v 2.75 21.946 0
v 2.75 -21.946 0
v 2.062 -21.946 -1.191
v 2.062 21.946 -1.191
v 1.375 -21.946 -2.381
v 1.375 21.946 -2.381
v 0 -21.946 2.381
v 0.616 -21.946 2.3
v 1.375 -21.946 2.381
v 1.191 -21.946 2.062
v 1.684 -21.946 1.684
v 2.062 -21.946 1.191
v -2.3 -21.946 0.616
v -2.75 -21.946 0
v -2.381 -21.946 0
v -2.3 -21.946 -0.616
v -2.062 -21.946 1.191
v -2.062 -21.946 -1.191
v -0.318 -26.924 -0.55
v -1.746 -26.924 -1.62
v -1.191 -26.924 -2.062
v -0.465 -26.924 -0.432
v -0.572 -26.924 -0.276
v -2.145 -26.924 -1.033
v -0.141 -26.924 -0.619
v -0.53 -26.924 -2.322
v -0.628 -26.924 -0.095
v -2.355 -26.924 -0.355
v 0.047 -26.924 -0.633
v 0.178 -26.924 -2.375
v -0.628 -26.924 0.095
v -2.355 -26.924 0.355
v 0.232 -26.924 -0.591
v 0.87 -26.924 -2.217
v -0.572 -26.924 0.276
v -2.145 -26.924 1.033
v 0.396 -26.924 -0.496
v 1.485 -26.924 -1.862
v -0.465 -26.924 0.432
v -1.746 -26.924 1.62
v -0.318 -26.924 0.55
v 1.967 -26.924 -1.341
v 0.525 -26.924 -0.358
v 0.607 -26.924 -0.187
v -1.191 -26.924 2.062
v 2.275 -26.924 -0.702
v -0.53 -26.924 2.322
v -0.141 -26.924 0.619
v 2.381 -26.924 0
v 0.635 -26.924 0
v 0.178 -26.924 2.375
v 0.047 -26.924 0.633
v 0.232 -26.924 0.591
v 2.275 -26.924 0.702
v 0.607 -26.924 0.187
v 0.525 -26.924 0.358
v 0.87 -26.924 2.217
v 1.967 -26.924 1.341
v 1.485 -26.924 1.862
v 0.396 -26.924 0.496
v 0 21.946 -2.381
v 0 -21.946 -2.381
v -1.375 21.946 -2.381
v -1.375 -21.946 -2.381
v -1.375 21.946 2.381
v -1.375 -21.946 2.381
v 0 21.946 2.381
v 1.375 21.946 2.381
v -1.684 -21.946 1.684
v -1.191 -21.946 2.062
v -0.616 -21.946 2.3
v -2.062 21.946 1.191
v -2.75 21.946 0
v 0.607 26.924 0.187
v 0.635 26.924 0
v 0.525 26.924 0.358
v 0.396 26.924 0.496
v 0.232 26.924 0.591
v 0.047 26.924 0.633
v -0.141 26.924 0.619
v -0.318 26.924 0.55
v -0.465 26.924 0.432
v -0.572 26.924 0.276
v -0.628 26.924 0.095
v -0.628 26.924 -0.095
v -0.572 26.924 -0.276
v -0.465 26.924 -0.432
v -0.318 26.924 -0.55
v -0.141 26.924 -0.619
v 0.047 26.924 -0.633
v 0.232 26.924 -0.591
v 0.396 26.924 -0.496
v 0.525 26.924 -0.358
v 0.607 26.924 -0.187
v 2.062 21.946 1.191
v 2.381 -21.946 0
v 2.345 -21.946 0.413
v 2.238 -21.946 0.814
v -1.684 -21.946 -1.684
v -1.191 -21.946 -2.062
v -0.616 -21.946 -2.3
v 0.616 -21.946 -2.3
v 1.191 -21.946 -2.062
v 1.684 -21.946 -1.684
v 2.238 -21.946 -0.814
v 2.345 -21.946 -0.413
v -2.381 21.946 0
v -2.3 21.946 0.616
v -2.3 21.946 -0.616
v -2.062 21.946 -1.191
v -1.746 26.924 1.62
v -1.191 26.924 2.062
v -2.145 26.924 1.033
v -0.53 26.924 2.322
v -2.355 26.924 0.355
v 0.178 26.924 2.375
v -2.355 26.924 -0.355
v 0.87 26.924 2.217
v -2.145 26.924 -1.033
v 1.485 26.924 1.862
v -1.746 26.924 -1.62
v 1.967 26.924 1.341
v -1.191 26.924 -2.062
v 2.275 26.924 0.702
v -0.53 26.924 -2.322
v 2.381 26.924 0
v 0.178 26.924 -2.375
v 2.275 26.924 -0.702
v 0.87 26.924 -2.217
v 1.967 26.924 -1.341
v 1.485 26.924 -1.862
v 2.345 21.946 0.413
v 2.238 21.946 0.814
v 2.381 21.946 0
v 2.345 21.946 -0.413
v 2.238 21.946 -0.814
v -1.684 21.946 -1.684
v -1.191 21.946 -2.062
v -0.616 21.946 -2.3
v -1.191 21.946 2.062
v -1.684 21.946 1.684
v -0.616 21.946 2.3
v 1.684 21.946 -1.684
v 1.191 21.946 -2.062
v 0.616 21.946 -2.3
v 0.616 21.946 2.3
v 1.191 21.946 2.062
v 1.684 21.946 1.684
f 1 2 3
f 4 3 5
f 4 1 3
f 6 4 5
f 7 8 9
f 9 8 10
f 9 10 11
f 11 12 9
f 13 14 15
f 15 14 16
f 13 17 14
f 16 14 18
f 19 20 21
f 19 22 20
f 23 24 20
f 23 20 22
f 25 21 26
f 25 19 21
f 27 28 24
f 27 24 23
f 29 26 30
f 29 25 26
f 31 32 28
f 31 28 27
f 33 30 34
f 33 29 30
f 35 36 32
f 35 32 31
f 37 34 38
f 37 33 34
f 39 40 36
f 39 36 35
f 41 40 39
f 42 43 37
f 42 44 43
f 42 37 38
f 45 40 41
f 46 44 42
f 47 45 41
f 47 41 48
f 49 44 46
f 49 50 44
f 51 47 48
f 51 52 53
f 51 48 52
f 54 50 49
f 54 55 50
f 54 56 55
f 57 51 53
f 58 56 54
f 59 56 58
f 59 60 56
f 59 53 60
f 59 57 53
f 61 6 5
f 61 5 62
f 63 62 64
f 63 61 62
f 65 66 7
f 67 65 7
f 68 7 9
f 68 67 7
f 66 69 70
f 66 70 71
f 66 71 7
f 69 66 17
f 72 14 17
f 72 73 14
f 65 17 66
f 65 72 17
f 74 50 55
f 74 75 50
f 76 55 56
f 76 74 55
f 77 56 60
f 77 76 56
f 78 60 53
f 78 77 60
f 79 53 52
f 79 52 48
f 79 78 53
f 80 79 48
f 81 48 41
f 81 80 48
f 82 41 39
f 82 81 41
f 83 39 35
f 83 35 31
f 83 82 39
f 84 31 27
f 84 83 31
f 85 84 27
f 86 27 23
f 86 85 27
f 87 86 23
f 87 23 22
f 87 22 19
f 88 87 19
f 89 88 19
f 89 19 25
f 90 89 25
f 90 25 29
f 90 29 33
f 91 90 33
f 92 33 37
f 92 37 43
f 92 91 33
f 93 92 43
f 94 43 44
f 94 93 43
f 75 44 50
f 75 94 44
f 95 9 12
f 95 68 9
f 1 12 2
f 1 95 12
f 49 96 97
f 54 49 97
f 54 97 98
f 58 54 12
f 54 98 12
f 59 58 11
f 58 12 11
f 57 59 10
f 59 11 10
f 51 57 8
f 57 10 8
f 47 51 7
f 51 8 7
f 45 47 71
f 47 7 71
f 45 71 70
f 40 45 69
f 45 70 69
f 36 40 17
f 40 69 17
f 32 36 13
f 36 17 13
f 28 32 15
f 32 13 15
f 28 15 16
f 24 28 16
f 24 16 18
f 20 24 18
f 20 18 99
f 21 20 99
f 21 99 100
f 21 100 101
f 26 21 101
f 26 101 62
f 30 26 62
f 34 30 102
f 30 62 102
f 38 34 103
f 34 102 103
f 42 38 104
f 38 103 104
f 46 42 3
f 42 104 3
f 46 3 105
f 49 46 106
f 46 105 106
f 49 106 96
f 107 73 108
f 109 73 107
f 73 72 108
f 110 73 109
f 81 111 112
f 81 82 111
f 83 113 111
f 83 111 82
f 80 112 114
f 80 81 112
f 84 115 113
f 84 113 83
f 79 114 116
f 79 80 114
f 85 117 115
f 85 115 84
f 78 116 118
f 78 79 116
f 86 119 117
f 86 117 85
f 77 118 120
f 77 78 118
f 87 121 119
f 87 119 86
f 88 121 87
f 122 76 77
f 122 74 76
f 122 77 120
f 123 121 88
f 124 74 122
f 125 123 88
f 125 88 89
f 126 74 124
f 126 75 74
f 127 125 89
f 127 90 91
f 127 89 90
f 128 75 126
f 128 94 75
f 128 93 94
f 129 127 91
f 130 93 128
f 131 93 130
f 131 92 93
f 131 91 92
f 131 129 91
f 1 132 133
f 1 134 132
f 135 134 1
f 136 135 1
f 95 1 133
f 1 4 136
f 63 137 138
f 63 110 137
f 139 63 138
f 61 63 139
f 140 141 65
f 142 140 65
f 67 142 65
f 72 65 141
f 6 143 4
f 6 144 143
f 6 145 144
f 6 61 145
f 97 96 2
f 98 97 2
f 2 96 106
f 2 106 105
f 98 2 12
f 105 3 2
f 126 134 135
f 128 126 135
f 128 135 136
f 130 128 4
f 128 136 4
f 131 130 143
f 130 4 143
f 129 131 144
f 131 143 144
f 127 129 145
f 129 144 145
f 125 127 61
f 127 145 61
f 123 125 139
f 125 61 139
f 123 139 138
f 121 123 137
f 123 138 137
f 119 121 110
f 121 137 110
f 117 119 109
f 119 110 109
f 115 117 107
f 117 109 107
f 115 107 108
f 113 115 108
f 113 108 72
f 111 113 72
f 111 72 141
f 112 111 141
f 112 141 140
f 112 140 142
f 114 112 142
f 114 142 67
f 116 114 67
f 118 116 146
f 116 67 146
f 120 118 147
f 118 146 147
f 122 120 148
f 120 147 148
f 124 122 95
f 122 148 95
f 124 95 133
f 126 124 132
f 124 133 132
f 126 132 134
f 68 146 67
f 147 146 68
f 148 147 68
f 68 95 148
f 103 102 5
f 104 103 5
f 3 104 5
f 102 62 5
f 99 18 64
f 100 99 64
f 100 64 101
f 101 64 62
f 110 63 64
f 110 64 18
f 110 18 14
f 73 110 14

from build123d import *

# Parameters (mm, degrees)
SKETCH1_R           = 0.635
BOSS_EXTRUDE1_DEPTH = 21.9456
SKETCH2_R           = 2.38125
SKETCH2_R_2         = 0.635
BOSS_EXTRUDE2_DEPTH = 4.9784
SKETCH3_R           = 2.38125
SKETCH3_R_2         = 0.635
BOSS_EXTRUDE3_DEPTH = 4.9784


with BuildPart() as part:
    # Sketch1 → Boss-Extrude1 (new body, symmetric)
    with BuildSketch(Plane(origin=(0, 0, 0), x_dir=(1, 0, 0), z_dir=(0, 1, 0))):
        Polygon((1.374815329, -2.38125), (2.749630657, 0), (1.374815329, 2.38125), (-1.374815329, 2.38125), (-2.749630657, 0), (-1.374815329, -2.38125), align=None)
        Circle(SKETCH1_R, mode=Mode.SUBTRACT)
    extrude(amount=BOSS_EXTRUDE1_DEPTH, both=True)

    # Sketch2 → Boss-Extrude2 (add)
    with BuildSketch(Plane(origin=(0, 21.9456, 0), x_dir=(1, 0, 0), z_dir=(0, 1, 0))):
        Circle(SKETCH2_R)
        Circle(SKETCH2_R_2, mode=Mode.SUBTRACT)
    extrude(amount=BOSS_EXTRUDE2_DEPTH)

    # Sketch3 → Boss-Extrude3 (add)
    with BuildSketch(Plane.XZ.offset(21.9456)):
        Circle(SKETCH3_R)
        Circle(SKETCH3_R_2, mode=Mode.SUBTRACT)
    extrude(amount=BOSS_EXTRUDE3_DEPTH)


solid = part.part
